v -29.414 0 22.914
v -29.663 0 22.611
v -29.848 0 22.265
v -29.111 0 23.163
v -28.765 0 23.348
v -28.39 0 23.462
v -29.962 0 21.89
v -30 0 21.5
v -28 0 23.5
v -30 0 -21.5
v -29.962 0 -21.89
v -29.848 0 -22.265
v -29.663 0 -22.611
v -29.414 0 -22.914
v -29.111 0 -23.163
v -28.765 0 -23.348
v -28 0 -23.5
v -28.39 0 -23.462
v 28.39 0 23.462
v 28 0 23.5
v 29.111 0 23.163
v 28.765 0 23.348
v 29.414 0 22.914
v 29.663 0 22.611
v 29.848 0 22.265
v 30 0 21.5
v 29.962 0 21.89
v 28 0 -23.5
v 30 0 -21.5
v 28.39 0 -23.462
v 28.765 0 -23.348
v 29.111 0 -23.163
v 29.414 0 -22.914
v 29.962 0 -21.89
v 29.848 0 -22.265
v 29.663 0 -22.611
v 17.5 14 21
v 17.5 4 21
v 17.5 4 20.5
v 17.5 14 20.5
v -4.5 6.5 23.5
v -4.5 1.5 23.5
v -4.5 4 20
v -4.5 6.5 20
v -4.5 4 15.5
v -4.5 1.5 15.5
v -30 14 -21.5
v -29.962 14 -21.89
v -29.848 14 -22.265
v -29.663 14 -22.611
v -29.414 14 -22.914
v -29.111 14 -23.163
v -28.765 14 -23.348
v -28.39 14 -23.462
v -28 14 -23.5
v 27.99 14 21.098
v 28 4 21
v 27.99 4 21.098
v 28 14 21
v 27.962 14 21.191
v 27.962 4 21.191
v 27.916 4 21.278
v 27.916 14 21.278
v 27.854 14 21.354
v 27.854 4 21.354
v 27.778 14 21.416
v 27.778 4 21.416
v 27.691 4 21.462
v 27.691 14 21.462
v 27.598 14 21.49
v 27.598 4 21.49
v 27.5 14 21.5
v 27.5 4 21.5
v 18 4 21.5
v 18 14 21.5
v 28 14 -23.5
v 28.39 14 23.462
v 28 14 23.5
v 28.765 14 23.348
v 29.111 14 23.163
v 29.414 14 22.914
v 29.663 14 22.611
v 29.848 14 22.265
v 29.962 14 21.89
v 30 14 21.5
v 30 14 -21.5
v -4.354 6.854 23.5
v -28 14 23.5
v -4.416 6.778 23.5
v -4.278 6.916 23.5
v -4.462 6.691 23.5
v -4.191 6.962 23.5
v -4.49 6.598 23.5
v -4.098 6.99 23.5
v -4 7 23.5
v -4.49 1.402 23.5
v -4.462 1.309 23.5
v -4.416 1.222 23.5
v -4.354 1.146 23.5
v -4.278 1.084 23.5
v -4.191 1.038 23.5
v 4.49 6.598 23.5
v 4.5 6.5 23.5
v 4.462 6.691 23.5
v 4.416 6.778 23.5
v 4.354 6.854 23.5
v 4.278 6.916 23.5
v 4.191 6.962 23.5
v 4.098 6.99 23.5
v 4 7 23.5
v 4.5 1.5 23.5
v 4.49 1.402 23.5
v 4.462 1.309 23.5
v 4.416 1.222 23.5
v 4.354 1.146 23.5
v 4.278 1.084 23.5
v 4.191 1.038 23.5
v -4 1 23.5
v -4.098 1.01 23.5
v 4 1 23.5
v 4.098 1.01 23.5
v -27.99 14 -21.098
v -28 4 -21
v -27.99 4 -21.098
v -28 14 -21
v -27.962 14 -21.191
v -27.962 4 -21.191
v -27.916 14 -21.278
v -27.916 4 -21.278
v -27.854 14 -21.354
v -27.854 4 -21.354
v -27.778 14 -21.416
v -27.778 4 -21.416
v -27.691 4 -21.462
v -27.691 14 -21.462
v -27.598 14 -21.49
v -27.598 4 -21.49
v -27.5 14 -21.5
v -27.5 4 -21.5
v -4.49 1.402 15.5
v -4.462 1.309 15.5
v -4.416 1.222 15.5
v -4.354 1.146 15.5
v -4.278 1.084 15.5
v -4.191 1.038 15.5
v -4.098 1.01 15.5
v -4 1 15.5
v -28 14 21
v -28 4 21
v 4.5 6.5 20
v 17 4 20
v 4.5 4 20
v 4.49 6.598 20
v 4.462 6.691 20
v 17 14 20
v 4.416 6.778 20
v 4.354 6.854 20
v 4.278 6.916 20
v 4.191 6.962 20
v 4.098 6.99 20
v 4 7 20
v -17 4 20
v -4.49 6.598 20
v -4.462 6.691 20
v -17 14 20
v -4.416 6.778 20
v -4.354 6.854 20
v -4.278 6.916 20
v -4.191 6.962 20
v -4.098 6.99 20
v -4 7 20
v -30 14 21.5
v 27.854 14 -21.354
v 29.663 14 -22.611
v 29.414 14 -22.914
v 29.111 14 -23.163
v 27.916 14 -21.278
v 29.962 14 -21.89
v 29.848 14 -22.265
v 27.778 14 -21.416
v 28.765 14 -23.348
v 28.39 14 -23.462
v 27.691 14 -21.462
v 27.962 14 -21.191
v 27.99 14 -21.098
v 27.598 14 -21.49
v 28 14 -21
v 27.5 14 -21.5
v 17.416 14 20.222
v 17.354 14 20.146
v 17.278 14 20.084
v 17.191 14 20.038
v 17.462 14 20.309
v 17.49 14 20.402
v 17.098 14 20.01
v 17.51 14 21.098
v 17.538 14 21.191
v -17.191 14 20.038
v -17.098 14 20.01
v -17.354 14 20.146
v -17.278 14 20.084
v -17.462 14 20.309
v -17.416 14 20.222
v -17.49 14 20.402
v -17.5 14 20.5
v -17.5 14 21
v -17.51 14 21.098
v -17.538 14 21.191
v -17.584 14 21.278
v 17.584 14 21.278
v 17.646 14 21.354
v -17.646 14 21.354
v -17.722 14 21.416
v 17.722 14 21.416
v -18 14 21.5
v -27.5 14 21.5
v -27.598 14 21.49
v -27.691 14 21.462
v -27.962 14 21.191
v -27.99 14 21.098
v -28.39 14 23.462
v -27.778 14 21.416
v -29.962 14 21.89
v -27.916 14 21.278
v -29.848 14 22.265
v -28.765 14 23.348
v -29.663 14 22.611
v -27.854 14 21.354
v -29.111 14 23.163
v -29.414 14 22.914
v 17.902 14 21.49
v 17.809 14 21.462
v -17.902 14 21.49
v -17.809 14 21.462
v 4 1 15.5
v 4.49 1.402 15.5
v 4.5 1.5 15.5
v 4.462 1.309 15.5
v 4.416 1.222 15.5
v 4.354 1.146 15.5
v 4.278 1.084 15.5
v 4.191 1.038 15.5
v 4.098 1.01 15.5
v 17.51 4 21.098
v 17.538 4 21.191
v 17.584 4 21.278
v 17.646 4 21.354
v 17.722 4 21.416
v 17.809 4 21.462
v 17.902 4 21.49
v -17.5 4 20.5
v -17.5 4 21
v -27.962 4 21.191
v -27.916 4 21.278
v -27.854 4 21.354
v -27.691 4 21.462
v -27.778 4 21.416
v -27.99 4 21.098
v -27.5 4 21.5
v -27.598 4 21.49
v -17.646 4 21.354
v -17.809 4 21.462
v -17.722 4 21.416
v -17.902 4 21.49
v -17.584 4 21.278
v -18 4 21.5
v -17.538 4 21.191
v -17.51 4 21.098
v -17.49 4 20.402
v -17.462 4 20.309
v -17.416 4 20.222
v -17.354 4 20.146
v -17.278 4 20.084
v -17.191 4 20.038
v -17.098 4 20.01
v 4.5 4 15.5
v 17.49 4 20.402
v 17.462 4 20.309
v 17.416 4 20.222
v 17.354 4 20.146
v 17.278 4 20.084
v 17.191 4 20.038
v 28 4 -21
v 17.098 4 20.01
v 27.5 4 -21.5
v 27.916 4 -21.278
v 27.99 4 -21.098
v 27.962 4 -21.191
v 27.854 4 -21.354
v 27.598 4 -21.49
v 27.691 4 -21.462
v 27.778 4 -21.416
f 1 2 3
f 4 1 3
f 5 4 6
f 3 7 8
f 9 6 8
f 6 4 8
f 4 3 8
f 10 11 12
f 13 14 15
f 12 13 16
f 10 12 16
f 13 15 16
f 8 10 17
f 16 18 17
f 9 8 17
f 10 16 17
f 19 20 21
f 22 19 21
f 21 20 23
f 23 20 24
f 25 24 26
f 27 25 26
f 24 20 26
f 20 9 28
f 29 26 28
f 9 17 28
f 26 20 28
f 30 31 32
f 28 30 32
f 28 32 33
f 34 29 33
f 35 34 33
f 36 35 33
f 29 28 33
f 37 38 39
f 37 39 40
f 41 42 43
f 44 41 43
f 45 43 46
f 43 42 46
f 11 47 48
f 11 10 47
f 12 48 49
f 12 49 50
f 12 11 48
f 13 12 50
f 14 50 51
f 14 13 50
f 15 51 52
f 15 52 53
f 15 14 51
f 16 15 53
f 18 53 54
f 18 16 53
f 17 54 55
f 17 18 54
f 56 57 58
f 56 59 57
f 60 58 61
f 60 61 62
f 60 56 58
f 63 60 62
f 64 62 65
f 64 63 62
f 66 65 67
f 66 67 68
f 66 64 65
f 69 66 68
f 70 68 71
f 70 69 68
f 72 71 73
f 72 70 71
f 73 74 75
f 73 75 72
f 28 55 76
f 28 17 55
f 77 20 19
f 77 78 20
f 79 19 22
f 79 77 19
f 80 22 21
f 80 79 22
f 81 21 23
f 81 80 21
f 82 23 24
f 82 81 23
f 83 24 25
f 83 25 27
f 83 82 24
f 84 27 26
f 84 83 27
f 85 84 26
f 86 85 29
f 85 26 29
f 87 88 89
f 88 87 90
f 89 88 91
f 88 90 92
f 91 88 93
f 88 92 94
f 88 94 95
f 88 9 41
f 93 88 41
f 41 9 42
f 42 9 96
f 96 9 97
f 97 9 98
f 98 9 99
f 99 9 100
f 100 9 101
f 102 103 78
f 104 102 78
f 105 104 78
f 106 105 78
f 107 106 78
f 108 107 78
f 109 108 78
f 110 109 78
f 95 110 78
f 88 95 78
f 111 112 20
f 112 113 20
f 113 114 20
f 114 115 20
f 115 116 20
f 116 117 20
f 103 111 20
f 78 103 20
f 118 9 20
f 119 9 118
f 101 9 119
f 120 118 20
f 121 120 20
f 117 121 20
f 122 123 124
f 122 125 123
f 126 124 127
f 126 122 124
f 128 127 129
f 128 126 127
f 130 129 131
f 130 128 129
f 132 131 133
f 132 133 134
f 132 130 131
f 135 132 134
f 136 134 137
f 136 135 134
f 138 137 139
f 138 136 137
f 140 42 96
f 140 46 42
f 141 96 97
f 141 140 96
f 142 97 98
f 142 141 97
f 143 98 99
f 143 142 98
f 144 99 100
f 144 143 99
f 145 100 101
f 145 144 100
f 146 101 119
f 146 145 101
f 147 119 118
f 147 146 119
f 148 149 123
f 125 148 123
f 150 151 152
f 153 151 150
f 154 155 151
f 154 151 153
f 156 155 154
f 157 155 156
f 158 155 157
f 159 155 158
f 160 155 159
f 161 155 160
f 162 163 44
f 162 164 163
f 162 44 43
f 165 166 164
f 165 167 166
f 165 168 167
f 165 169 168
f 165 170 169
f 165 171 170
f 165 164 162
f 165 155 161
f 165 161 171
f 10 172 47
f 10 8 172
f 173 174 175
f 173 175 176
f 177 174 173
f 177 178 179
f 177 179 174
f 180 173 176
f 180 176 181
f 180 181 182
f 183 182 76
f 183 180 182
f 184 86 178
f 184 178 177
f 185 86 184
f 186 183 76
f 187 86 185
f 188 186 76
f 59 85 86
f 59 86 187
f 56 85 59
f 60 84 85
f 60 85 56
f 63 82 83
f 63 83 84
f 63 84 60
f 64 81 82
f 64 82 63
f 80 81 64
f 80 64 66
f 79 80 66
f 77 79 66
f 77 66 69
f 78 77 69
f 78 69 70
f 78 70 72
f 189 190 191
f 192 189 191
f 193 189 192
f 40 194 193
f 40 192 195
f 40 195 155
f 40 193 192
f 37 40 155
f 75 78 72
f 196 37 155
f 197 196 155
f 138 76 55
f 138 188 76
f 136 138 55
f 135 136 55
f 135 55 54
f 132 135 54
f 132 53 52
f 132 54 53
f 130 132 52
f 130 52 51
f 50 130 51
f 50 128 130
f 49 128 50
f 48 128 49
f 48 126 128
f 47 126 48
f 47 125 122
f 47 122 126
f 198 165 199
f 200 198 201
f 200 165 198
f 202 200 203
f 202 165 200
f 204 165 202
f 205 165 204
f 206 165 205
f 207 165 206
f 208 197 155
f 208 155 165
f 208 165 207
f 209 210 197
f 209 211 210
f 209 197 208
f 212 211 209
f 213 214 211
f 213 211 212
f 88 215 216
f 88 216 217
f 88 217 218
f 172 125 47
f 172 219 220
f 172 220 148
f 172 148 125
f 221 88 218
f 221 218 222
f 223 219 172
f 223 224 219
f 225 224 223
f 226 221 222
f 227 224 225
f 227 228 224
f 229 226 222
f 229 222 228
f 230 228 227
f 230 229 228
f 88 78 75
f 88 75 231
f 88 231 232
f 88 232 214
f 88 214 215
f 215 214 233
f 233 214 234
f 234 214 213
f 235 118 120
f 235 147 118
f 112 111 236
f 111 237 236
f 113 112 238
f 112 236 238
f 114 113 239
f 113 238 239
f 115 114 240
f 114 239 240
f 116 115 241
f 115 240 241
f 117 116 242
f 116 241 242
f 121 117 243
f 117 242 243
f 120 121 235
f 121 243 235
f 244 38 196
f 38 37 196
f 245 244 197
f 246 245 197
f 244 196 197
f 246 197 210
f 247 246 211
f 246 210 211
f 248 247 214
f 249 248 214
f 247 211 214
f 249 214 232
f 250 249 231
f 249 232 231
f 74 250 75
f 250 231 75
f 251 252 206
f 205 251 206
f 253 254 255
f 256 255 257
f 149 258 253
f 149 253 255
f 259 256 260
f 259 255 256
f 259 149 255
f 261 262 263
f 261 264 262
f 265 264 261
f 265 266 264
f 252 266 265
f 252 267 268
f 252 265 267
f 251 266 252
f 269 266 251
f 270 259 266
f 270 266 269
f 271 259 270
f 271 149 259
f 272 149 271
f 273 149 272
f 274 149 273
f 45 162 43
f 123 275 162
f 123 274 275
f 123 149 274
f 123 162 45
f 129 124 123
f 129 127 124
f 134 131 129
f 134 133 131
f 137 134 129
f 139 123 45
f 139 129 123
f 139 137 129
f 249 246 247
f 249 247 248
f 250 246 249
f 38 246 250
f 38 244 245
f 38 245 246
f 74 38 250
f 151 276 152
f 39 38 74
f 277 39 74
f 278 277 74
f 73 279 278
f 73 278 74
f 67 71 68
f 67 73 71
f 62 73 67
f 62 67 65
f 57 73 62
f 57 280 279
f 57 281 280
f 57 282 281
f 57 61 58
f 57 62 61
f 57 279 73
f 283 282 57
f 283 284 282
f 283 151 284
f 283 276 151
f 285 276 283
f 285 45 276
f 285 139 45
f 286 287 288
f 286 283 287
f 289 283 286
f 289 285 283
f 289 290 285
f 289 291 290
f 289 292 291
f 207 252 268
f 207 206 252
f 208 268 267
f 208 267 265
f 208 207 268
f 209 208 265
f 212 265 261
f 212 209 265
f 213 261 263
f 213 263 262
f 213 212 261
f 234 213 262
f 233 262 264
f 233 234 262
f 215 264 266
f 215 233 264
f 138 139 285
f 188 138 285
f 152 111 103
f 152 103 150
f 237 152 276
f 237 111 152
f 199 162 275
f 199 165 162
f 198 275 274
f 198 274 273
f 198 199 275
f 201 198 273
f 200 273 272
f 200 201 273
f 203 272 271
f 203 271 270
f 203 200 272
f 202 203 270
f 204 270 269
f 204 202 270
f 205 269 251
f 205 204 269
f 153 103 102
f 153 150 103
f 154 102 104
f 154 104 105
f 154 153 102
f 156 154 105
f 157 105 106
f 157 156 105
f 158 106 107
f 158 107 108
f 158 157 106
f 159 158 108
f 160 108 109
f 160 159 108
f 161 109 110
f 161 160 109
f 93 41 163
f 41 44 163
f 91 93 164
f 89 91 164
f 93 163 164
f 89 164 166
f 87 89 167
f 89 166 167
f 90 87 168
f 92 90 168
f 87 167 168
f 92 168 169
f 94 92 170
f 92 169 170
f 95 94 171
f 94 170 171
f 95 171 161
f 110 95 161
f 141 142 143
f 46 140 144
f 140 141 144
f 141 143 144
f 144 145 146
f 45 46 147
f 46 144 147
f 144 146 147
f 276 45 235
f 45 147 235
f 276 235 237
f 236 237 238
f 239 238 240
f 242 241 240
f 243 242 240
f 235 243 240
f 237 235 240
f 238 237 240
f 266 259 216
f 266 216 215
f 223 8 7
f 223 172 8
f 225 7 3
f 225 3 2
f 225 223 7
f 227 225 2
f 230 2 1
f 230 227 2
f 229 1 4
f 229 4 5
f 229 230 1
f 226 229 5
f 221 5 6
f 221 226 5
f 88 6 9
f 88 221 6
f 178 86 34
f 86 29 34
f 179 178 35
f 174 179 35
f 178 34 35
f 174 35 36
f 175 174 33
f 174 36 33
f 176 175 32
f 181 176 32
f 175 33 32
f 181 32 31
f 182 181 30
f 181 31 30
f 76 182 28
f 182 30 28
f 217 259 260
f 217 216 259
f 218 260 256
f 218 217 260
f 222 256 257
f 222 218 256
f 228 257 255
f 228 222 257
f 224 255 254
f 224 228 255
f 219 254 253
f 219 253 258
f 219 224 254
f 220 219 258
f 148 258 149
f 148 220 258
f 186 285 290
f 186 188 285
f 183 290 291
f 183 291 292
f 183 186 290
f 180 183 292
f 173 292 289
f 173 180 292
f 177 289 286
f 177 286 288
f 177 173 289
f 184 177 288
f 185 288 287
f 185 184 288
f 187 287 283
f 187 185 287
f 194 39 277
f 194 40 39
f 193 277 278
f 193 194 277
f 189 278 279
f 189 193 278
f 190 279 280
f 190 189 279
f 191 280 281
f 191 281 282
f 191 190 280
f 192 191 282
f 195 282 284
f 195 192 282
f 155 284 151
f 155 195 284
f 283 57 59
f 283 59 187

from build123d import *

# Parameters (mm, degrees)
SKETCH1_W               = 60
SKETCH1_H               = 47
BOSS_EXTRUDE1_DEPTH     = 4
SKETCH2_W               = 60
SKETCH2_H               = 47
SKETCH2_W_2             = 56
SKETCH2_H_2             = 43
BOSS_EXTRUDE2_DEPTH     = 10
SKETCH4_W               = 35
SKETCH4_H               = 12
BOSS_EXTRUDE3_DEPTH     = 1.5
CUT_EXTRUDE1_DEPTH      = 3
CUT_EXTRUDE1_DEPTH_BACK = 3
SKETCH5_W               = 9
SKETCH5_H               = 8
FILLET1_R               = 2
FILLET2_R               = 0.5
FILLET3_R               = 0.5


with BuildPart() as part:
    # Sketch1 → Boss-Extrude1 (new body)
    with BuildSketch(Plane(origin=(0, 0, 0), x_dir=(1, 0, 0), z_dir=(0, 1, 0))):
        Rectangle(SKETCH1_W, SKETCH1_H)
    extrude(amount=BOSS_EXTRUDE1_DEPTH)

    # Sketch2 → Boss-Extrude2 (add)
    with BuildSketch(Plane(origin=(0, 4, 0), x_dir=(1, 0, 0), z_dir=(0, 1, 0))):
        Rectangle(SKETCH2_W, SKETCH2_H)
        Rectangle(SKETCH2_W_2, SKETCH2_H_2, mode=Mode.SUBTRACT)
    extrude(amount=BOSS_EXTRUDE2_DEPTH)

    # Sketch4 → Boss-Extrude3 (add)
    with BuildSketch(Plane(origin=(0, 0, 21.5), x_dir=(-1, 0, 0), z_dir=(0, 0, -1))):
        with Locations((0, 8)):
            Rectangle(SKETCH4_W, SKETCH4_H)
    extrude(amount=BOSS_EXTRUDE3_DEPTH)

    # Sketch5 → Cut-Extrude1 (cut, two sides: drawn at the far end of the back side and taken through both)
    with BuildSketch(Plane(origin=(0, 4, 0), x_dir=(1, 0, 0), z_dir=(0, 1, 0)).offset(-CUT_EXTRUDE1_DEPTH_BACK)):
        with Locations((0, -19.5)):
            Rectangle(SKETCH5_W, SKETCH5_H)
    extrude(amount=CUT_EXTRUDE1_DEPTH + CUT_EXTRUDE1_DEPTH_BACK, mode=Mode.SUBTRACT)

    # Fillet1
    fillet1_edges = [part.edges().sort_by_distance(p)[0] for p in [
        (30, 7, 23.5),
        (-30, 7, 23.5),
        (-30, 7, -23.5),
        (30, 7, -23.5),
    ]]
    fillet(fillet1_edges, radius=FILLET1_R)

    # Fillet2
    fillet2_edges = [part.edges().sort_by_distance(p)[0] for p in [
        (28, 9, -21.5),
        (-28, 9, -21.5),
        (-28, 9, 21.5),
        (28, 9, 21.5),
        (-17.5, 9, 21.5),
        (17.5, 9, 21.5),
        (17.5, 9, 20),
        (-17.5, 9, 20),
    ]]
    fillet(fillet2_edges, radius=FILLET2_R)

    # Fillet3
    fillet3_edges = [part.edges().sort_by_distance(p)[0] for p in [
        (4.5, 1, 19.5),
        (-4.5, 1, 19.5),
        (4.5, 7, 21.75),
        (-4.5, 7, 21.75),
    ]]
    fillet(fillet3_edges, radius=FILLET3_R)


solid = part.part
